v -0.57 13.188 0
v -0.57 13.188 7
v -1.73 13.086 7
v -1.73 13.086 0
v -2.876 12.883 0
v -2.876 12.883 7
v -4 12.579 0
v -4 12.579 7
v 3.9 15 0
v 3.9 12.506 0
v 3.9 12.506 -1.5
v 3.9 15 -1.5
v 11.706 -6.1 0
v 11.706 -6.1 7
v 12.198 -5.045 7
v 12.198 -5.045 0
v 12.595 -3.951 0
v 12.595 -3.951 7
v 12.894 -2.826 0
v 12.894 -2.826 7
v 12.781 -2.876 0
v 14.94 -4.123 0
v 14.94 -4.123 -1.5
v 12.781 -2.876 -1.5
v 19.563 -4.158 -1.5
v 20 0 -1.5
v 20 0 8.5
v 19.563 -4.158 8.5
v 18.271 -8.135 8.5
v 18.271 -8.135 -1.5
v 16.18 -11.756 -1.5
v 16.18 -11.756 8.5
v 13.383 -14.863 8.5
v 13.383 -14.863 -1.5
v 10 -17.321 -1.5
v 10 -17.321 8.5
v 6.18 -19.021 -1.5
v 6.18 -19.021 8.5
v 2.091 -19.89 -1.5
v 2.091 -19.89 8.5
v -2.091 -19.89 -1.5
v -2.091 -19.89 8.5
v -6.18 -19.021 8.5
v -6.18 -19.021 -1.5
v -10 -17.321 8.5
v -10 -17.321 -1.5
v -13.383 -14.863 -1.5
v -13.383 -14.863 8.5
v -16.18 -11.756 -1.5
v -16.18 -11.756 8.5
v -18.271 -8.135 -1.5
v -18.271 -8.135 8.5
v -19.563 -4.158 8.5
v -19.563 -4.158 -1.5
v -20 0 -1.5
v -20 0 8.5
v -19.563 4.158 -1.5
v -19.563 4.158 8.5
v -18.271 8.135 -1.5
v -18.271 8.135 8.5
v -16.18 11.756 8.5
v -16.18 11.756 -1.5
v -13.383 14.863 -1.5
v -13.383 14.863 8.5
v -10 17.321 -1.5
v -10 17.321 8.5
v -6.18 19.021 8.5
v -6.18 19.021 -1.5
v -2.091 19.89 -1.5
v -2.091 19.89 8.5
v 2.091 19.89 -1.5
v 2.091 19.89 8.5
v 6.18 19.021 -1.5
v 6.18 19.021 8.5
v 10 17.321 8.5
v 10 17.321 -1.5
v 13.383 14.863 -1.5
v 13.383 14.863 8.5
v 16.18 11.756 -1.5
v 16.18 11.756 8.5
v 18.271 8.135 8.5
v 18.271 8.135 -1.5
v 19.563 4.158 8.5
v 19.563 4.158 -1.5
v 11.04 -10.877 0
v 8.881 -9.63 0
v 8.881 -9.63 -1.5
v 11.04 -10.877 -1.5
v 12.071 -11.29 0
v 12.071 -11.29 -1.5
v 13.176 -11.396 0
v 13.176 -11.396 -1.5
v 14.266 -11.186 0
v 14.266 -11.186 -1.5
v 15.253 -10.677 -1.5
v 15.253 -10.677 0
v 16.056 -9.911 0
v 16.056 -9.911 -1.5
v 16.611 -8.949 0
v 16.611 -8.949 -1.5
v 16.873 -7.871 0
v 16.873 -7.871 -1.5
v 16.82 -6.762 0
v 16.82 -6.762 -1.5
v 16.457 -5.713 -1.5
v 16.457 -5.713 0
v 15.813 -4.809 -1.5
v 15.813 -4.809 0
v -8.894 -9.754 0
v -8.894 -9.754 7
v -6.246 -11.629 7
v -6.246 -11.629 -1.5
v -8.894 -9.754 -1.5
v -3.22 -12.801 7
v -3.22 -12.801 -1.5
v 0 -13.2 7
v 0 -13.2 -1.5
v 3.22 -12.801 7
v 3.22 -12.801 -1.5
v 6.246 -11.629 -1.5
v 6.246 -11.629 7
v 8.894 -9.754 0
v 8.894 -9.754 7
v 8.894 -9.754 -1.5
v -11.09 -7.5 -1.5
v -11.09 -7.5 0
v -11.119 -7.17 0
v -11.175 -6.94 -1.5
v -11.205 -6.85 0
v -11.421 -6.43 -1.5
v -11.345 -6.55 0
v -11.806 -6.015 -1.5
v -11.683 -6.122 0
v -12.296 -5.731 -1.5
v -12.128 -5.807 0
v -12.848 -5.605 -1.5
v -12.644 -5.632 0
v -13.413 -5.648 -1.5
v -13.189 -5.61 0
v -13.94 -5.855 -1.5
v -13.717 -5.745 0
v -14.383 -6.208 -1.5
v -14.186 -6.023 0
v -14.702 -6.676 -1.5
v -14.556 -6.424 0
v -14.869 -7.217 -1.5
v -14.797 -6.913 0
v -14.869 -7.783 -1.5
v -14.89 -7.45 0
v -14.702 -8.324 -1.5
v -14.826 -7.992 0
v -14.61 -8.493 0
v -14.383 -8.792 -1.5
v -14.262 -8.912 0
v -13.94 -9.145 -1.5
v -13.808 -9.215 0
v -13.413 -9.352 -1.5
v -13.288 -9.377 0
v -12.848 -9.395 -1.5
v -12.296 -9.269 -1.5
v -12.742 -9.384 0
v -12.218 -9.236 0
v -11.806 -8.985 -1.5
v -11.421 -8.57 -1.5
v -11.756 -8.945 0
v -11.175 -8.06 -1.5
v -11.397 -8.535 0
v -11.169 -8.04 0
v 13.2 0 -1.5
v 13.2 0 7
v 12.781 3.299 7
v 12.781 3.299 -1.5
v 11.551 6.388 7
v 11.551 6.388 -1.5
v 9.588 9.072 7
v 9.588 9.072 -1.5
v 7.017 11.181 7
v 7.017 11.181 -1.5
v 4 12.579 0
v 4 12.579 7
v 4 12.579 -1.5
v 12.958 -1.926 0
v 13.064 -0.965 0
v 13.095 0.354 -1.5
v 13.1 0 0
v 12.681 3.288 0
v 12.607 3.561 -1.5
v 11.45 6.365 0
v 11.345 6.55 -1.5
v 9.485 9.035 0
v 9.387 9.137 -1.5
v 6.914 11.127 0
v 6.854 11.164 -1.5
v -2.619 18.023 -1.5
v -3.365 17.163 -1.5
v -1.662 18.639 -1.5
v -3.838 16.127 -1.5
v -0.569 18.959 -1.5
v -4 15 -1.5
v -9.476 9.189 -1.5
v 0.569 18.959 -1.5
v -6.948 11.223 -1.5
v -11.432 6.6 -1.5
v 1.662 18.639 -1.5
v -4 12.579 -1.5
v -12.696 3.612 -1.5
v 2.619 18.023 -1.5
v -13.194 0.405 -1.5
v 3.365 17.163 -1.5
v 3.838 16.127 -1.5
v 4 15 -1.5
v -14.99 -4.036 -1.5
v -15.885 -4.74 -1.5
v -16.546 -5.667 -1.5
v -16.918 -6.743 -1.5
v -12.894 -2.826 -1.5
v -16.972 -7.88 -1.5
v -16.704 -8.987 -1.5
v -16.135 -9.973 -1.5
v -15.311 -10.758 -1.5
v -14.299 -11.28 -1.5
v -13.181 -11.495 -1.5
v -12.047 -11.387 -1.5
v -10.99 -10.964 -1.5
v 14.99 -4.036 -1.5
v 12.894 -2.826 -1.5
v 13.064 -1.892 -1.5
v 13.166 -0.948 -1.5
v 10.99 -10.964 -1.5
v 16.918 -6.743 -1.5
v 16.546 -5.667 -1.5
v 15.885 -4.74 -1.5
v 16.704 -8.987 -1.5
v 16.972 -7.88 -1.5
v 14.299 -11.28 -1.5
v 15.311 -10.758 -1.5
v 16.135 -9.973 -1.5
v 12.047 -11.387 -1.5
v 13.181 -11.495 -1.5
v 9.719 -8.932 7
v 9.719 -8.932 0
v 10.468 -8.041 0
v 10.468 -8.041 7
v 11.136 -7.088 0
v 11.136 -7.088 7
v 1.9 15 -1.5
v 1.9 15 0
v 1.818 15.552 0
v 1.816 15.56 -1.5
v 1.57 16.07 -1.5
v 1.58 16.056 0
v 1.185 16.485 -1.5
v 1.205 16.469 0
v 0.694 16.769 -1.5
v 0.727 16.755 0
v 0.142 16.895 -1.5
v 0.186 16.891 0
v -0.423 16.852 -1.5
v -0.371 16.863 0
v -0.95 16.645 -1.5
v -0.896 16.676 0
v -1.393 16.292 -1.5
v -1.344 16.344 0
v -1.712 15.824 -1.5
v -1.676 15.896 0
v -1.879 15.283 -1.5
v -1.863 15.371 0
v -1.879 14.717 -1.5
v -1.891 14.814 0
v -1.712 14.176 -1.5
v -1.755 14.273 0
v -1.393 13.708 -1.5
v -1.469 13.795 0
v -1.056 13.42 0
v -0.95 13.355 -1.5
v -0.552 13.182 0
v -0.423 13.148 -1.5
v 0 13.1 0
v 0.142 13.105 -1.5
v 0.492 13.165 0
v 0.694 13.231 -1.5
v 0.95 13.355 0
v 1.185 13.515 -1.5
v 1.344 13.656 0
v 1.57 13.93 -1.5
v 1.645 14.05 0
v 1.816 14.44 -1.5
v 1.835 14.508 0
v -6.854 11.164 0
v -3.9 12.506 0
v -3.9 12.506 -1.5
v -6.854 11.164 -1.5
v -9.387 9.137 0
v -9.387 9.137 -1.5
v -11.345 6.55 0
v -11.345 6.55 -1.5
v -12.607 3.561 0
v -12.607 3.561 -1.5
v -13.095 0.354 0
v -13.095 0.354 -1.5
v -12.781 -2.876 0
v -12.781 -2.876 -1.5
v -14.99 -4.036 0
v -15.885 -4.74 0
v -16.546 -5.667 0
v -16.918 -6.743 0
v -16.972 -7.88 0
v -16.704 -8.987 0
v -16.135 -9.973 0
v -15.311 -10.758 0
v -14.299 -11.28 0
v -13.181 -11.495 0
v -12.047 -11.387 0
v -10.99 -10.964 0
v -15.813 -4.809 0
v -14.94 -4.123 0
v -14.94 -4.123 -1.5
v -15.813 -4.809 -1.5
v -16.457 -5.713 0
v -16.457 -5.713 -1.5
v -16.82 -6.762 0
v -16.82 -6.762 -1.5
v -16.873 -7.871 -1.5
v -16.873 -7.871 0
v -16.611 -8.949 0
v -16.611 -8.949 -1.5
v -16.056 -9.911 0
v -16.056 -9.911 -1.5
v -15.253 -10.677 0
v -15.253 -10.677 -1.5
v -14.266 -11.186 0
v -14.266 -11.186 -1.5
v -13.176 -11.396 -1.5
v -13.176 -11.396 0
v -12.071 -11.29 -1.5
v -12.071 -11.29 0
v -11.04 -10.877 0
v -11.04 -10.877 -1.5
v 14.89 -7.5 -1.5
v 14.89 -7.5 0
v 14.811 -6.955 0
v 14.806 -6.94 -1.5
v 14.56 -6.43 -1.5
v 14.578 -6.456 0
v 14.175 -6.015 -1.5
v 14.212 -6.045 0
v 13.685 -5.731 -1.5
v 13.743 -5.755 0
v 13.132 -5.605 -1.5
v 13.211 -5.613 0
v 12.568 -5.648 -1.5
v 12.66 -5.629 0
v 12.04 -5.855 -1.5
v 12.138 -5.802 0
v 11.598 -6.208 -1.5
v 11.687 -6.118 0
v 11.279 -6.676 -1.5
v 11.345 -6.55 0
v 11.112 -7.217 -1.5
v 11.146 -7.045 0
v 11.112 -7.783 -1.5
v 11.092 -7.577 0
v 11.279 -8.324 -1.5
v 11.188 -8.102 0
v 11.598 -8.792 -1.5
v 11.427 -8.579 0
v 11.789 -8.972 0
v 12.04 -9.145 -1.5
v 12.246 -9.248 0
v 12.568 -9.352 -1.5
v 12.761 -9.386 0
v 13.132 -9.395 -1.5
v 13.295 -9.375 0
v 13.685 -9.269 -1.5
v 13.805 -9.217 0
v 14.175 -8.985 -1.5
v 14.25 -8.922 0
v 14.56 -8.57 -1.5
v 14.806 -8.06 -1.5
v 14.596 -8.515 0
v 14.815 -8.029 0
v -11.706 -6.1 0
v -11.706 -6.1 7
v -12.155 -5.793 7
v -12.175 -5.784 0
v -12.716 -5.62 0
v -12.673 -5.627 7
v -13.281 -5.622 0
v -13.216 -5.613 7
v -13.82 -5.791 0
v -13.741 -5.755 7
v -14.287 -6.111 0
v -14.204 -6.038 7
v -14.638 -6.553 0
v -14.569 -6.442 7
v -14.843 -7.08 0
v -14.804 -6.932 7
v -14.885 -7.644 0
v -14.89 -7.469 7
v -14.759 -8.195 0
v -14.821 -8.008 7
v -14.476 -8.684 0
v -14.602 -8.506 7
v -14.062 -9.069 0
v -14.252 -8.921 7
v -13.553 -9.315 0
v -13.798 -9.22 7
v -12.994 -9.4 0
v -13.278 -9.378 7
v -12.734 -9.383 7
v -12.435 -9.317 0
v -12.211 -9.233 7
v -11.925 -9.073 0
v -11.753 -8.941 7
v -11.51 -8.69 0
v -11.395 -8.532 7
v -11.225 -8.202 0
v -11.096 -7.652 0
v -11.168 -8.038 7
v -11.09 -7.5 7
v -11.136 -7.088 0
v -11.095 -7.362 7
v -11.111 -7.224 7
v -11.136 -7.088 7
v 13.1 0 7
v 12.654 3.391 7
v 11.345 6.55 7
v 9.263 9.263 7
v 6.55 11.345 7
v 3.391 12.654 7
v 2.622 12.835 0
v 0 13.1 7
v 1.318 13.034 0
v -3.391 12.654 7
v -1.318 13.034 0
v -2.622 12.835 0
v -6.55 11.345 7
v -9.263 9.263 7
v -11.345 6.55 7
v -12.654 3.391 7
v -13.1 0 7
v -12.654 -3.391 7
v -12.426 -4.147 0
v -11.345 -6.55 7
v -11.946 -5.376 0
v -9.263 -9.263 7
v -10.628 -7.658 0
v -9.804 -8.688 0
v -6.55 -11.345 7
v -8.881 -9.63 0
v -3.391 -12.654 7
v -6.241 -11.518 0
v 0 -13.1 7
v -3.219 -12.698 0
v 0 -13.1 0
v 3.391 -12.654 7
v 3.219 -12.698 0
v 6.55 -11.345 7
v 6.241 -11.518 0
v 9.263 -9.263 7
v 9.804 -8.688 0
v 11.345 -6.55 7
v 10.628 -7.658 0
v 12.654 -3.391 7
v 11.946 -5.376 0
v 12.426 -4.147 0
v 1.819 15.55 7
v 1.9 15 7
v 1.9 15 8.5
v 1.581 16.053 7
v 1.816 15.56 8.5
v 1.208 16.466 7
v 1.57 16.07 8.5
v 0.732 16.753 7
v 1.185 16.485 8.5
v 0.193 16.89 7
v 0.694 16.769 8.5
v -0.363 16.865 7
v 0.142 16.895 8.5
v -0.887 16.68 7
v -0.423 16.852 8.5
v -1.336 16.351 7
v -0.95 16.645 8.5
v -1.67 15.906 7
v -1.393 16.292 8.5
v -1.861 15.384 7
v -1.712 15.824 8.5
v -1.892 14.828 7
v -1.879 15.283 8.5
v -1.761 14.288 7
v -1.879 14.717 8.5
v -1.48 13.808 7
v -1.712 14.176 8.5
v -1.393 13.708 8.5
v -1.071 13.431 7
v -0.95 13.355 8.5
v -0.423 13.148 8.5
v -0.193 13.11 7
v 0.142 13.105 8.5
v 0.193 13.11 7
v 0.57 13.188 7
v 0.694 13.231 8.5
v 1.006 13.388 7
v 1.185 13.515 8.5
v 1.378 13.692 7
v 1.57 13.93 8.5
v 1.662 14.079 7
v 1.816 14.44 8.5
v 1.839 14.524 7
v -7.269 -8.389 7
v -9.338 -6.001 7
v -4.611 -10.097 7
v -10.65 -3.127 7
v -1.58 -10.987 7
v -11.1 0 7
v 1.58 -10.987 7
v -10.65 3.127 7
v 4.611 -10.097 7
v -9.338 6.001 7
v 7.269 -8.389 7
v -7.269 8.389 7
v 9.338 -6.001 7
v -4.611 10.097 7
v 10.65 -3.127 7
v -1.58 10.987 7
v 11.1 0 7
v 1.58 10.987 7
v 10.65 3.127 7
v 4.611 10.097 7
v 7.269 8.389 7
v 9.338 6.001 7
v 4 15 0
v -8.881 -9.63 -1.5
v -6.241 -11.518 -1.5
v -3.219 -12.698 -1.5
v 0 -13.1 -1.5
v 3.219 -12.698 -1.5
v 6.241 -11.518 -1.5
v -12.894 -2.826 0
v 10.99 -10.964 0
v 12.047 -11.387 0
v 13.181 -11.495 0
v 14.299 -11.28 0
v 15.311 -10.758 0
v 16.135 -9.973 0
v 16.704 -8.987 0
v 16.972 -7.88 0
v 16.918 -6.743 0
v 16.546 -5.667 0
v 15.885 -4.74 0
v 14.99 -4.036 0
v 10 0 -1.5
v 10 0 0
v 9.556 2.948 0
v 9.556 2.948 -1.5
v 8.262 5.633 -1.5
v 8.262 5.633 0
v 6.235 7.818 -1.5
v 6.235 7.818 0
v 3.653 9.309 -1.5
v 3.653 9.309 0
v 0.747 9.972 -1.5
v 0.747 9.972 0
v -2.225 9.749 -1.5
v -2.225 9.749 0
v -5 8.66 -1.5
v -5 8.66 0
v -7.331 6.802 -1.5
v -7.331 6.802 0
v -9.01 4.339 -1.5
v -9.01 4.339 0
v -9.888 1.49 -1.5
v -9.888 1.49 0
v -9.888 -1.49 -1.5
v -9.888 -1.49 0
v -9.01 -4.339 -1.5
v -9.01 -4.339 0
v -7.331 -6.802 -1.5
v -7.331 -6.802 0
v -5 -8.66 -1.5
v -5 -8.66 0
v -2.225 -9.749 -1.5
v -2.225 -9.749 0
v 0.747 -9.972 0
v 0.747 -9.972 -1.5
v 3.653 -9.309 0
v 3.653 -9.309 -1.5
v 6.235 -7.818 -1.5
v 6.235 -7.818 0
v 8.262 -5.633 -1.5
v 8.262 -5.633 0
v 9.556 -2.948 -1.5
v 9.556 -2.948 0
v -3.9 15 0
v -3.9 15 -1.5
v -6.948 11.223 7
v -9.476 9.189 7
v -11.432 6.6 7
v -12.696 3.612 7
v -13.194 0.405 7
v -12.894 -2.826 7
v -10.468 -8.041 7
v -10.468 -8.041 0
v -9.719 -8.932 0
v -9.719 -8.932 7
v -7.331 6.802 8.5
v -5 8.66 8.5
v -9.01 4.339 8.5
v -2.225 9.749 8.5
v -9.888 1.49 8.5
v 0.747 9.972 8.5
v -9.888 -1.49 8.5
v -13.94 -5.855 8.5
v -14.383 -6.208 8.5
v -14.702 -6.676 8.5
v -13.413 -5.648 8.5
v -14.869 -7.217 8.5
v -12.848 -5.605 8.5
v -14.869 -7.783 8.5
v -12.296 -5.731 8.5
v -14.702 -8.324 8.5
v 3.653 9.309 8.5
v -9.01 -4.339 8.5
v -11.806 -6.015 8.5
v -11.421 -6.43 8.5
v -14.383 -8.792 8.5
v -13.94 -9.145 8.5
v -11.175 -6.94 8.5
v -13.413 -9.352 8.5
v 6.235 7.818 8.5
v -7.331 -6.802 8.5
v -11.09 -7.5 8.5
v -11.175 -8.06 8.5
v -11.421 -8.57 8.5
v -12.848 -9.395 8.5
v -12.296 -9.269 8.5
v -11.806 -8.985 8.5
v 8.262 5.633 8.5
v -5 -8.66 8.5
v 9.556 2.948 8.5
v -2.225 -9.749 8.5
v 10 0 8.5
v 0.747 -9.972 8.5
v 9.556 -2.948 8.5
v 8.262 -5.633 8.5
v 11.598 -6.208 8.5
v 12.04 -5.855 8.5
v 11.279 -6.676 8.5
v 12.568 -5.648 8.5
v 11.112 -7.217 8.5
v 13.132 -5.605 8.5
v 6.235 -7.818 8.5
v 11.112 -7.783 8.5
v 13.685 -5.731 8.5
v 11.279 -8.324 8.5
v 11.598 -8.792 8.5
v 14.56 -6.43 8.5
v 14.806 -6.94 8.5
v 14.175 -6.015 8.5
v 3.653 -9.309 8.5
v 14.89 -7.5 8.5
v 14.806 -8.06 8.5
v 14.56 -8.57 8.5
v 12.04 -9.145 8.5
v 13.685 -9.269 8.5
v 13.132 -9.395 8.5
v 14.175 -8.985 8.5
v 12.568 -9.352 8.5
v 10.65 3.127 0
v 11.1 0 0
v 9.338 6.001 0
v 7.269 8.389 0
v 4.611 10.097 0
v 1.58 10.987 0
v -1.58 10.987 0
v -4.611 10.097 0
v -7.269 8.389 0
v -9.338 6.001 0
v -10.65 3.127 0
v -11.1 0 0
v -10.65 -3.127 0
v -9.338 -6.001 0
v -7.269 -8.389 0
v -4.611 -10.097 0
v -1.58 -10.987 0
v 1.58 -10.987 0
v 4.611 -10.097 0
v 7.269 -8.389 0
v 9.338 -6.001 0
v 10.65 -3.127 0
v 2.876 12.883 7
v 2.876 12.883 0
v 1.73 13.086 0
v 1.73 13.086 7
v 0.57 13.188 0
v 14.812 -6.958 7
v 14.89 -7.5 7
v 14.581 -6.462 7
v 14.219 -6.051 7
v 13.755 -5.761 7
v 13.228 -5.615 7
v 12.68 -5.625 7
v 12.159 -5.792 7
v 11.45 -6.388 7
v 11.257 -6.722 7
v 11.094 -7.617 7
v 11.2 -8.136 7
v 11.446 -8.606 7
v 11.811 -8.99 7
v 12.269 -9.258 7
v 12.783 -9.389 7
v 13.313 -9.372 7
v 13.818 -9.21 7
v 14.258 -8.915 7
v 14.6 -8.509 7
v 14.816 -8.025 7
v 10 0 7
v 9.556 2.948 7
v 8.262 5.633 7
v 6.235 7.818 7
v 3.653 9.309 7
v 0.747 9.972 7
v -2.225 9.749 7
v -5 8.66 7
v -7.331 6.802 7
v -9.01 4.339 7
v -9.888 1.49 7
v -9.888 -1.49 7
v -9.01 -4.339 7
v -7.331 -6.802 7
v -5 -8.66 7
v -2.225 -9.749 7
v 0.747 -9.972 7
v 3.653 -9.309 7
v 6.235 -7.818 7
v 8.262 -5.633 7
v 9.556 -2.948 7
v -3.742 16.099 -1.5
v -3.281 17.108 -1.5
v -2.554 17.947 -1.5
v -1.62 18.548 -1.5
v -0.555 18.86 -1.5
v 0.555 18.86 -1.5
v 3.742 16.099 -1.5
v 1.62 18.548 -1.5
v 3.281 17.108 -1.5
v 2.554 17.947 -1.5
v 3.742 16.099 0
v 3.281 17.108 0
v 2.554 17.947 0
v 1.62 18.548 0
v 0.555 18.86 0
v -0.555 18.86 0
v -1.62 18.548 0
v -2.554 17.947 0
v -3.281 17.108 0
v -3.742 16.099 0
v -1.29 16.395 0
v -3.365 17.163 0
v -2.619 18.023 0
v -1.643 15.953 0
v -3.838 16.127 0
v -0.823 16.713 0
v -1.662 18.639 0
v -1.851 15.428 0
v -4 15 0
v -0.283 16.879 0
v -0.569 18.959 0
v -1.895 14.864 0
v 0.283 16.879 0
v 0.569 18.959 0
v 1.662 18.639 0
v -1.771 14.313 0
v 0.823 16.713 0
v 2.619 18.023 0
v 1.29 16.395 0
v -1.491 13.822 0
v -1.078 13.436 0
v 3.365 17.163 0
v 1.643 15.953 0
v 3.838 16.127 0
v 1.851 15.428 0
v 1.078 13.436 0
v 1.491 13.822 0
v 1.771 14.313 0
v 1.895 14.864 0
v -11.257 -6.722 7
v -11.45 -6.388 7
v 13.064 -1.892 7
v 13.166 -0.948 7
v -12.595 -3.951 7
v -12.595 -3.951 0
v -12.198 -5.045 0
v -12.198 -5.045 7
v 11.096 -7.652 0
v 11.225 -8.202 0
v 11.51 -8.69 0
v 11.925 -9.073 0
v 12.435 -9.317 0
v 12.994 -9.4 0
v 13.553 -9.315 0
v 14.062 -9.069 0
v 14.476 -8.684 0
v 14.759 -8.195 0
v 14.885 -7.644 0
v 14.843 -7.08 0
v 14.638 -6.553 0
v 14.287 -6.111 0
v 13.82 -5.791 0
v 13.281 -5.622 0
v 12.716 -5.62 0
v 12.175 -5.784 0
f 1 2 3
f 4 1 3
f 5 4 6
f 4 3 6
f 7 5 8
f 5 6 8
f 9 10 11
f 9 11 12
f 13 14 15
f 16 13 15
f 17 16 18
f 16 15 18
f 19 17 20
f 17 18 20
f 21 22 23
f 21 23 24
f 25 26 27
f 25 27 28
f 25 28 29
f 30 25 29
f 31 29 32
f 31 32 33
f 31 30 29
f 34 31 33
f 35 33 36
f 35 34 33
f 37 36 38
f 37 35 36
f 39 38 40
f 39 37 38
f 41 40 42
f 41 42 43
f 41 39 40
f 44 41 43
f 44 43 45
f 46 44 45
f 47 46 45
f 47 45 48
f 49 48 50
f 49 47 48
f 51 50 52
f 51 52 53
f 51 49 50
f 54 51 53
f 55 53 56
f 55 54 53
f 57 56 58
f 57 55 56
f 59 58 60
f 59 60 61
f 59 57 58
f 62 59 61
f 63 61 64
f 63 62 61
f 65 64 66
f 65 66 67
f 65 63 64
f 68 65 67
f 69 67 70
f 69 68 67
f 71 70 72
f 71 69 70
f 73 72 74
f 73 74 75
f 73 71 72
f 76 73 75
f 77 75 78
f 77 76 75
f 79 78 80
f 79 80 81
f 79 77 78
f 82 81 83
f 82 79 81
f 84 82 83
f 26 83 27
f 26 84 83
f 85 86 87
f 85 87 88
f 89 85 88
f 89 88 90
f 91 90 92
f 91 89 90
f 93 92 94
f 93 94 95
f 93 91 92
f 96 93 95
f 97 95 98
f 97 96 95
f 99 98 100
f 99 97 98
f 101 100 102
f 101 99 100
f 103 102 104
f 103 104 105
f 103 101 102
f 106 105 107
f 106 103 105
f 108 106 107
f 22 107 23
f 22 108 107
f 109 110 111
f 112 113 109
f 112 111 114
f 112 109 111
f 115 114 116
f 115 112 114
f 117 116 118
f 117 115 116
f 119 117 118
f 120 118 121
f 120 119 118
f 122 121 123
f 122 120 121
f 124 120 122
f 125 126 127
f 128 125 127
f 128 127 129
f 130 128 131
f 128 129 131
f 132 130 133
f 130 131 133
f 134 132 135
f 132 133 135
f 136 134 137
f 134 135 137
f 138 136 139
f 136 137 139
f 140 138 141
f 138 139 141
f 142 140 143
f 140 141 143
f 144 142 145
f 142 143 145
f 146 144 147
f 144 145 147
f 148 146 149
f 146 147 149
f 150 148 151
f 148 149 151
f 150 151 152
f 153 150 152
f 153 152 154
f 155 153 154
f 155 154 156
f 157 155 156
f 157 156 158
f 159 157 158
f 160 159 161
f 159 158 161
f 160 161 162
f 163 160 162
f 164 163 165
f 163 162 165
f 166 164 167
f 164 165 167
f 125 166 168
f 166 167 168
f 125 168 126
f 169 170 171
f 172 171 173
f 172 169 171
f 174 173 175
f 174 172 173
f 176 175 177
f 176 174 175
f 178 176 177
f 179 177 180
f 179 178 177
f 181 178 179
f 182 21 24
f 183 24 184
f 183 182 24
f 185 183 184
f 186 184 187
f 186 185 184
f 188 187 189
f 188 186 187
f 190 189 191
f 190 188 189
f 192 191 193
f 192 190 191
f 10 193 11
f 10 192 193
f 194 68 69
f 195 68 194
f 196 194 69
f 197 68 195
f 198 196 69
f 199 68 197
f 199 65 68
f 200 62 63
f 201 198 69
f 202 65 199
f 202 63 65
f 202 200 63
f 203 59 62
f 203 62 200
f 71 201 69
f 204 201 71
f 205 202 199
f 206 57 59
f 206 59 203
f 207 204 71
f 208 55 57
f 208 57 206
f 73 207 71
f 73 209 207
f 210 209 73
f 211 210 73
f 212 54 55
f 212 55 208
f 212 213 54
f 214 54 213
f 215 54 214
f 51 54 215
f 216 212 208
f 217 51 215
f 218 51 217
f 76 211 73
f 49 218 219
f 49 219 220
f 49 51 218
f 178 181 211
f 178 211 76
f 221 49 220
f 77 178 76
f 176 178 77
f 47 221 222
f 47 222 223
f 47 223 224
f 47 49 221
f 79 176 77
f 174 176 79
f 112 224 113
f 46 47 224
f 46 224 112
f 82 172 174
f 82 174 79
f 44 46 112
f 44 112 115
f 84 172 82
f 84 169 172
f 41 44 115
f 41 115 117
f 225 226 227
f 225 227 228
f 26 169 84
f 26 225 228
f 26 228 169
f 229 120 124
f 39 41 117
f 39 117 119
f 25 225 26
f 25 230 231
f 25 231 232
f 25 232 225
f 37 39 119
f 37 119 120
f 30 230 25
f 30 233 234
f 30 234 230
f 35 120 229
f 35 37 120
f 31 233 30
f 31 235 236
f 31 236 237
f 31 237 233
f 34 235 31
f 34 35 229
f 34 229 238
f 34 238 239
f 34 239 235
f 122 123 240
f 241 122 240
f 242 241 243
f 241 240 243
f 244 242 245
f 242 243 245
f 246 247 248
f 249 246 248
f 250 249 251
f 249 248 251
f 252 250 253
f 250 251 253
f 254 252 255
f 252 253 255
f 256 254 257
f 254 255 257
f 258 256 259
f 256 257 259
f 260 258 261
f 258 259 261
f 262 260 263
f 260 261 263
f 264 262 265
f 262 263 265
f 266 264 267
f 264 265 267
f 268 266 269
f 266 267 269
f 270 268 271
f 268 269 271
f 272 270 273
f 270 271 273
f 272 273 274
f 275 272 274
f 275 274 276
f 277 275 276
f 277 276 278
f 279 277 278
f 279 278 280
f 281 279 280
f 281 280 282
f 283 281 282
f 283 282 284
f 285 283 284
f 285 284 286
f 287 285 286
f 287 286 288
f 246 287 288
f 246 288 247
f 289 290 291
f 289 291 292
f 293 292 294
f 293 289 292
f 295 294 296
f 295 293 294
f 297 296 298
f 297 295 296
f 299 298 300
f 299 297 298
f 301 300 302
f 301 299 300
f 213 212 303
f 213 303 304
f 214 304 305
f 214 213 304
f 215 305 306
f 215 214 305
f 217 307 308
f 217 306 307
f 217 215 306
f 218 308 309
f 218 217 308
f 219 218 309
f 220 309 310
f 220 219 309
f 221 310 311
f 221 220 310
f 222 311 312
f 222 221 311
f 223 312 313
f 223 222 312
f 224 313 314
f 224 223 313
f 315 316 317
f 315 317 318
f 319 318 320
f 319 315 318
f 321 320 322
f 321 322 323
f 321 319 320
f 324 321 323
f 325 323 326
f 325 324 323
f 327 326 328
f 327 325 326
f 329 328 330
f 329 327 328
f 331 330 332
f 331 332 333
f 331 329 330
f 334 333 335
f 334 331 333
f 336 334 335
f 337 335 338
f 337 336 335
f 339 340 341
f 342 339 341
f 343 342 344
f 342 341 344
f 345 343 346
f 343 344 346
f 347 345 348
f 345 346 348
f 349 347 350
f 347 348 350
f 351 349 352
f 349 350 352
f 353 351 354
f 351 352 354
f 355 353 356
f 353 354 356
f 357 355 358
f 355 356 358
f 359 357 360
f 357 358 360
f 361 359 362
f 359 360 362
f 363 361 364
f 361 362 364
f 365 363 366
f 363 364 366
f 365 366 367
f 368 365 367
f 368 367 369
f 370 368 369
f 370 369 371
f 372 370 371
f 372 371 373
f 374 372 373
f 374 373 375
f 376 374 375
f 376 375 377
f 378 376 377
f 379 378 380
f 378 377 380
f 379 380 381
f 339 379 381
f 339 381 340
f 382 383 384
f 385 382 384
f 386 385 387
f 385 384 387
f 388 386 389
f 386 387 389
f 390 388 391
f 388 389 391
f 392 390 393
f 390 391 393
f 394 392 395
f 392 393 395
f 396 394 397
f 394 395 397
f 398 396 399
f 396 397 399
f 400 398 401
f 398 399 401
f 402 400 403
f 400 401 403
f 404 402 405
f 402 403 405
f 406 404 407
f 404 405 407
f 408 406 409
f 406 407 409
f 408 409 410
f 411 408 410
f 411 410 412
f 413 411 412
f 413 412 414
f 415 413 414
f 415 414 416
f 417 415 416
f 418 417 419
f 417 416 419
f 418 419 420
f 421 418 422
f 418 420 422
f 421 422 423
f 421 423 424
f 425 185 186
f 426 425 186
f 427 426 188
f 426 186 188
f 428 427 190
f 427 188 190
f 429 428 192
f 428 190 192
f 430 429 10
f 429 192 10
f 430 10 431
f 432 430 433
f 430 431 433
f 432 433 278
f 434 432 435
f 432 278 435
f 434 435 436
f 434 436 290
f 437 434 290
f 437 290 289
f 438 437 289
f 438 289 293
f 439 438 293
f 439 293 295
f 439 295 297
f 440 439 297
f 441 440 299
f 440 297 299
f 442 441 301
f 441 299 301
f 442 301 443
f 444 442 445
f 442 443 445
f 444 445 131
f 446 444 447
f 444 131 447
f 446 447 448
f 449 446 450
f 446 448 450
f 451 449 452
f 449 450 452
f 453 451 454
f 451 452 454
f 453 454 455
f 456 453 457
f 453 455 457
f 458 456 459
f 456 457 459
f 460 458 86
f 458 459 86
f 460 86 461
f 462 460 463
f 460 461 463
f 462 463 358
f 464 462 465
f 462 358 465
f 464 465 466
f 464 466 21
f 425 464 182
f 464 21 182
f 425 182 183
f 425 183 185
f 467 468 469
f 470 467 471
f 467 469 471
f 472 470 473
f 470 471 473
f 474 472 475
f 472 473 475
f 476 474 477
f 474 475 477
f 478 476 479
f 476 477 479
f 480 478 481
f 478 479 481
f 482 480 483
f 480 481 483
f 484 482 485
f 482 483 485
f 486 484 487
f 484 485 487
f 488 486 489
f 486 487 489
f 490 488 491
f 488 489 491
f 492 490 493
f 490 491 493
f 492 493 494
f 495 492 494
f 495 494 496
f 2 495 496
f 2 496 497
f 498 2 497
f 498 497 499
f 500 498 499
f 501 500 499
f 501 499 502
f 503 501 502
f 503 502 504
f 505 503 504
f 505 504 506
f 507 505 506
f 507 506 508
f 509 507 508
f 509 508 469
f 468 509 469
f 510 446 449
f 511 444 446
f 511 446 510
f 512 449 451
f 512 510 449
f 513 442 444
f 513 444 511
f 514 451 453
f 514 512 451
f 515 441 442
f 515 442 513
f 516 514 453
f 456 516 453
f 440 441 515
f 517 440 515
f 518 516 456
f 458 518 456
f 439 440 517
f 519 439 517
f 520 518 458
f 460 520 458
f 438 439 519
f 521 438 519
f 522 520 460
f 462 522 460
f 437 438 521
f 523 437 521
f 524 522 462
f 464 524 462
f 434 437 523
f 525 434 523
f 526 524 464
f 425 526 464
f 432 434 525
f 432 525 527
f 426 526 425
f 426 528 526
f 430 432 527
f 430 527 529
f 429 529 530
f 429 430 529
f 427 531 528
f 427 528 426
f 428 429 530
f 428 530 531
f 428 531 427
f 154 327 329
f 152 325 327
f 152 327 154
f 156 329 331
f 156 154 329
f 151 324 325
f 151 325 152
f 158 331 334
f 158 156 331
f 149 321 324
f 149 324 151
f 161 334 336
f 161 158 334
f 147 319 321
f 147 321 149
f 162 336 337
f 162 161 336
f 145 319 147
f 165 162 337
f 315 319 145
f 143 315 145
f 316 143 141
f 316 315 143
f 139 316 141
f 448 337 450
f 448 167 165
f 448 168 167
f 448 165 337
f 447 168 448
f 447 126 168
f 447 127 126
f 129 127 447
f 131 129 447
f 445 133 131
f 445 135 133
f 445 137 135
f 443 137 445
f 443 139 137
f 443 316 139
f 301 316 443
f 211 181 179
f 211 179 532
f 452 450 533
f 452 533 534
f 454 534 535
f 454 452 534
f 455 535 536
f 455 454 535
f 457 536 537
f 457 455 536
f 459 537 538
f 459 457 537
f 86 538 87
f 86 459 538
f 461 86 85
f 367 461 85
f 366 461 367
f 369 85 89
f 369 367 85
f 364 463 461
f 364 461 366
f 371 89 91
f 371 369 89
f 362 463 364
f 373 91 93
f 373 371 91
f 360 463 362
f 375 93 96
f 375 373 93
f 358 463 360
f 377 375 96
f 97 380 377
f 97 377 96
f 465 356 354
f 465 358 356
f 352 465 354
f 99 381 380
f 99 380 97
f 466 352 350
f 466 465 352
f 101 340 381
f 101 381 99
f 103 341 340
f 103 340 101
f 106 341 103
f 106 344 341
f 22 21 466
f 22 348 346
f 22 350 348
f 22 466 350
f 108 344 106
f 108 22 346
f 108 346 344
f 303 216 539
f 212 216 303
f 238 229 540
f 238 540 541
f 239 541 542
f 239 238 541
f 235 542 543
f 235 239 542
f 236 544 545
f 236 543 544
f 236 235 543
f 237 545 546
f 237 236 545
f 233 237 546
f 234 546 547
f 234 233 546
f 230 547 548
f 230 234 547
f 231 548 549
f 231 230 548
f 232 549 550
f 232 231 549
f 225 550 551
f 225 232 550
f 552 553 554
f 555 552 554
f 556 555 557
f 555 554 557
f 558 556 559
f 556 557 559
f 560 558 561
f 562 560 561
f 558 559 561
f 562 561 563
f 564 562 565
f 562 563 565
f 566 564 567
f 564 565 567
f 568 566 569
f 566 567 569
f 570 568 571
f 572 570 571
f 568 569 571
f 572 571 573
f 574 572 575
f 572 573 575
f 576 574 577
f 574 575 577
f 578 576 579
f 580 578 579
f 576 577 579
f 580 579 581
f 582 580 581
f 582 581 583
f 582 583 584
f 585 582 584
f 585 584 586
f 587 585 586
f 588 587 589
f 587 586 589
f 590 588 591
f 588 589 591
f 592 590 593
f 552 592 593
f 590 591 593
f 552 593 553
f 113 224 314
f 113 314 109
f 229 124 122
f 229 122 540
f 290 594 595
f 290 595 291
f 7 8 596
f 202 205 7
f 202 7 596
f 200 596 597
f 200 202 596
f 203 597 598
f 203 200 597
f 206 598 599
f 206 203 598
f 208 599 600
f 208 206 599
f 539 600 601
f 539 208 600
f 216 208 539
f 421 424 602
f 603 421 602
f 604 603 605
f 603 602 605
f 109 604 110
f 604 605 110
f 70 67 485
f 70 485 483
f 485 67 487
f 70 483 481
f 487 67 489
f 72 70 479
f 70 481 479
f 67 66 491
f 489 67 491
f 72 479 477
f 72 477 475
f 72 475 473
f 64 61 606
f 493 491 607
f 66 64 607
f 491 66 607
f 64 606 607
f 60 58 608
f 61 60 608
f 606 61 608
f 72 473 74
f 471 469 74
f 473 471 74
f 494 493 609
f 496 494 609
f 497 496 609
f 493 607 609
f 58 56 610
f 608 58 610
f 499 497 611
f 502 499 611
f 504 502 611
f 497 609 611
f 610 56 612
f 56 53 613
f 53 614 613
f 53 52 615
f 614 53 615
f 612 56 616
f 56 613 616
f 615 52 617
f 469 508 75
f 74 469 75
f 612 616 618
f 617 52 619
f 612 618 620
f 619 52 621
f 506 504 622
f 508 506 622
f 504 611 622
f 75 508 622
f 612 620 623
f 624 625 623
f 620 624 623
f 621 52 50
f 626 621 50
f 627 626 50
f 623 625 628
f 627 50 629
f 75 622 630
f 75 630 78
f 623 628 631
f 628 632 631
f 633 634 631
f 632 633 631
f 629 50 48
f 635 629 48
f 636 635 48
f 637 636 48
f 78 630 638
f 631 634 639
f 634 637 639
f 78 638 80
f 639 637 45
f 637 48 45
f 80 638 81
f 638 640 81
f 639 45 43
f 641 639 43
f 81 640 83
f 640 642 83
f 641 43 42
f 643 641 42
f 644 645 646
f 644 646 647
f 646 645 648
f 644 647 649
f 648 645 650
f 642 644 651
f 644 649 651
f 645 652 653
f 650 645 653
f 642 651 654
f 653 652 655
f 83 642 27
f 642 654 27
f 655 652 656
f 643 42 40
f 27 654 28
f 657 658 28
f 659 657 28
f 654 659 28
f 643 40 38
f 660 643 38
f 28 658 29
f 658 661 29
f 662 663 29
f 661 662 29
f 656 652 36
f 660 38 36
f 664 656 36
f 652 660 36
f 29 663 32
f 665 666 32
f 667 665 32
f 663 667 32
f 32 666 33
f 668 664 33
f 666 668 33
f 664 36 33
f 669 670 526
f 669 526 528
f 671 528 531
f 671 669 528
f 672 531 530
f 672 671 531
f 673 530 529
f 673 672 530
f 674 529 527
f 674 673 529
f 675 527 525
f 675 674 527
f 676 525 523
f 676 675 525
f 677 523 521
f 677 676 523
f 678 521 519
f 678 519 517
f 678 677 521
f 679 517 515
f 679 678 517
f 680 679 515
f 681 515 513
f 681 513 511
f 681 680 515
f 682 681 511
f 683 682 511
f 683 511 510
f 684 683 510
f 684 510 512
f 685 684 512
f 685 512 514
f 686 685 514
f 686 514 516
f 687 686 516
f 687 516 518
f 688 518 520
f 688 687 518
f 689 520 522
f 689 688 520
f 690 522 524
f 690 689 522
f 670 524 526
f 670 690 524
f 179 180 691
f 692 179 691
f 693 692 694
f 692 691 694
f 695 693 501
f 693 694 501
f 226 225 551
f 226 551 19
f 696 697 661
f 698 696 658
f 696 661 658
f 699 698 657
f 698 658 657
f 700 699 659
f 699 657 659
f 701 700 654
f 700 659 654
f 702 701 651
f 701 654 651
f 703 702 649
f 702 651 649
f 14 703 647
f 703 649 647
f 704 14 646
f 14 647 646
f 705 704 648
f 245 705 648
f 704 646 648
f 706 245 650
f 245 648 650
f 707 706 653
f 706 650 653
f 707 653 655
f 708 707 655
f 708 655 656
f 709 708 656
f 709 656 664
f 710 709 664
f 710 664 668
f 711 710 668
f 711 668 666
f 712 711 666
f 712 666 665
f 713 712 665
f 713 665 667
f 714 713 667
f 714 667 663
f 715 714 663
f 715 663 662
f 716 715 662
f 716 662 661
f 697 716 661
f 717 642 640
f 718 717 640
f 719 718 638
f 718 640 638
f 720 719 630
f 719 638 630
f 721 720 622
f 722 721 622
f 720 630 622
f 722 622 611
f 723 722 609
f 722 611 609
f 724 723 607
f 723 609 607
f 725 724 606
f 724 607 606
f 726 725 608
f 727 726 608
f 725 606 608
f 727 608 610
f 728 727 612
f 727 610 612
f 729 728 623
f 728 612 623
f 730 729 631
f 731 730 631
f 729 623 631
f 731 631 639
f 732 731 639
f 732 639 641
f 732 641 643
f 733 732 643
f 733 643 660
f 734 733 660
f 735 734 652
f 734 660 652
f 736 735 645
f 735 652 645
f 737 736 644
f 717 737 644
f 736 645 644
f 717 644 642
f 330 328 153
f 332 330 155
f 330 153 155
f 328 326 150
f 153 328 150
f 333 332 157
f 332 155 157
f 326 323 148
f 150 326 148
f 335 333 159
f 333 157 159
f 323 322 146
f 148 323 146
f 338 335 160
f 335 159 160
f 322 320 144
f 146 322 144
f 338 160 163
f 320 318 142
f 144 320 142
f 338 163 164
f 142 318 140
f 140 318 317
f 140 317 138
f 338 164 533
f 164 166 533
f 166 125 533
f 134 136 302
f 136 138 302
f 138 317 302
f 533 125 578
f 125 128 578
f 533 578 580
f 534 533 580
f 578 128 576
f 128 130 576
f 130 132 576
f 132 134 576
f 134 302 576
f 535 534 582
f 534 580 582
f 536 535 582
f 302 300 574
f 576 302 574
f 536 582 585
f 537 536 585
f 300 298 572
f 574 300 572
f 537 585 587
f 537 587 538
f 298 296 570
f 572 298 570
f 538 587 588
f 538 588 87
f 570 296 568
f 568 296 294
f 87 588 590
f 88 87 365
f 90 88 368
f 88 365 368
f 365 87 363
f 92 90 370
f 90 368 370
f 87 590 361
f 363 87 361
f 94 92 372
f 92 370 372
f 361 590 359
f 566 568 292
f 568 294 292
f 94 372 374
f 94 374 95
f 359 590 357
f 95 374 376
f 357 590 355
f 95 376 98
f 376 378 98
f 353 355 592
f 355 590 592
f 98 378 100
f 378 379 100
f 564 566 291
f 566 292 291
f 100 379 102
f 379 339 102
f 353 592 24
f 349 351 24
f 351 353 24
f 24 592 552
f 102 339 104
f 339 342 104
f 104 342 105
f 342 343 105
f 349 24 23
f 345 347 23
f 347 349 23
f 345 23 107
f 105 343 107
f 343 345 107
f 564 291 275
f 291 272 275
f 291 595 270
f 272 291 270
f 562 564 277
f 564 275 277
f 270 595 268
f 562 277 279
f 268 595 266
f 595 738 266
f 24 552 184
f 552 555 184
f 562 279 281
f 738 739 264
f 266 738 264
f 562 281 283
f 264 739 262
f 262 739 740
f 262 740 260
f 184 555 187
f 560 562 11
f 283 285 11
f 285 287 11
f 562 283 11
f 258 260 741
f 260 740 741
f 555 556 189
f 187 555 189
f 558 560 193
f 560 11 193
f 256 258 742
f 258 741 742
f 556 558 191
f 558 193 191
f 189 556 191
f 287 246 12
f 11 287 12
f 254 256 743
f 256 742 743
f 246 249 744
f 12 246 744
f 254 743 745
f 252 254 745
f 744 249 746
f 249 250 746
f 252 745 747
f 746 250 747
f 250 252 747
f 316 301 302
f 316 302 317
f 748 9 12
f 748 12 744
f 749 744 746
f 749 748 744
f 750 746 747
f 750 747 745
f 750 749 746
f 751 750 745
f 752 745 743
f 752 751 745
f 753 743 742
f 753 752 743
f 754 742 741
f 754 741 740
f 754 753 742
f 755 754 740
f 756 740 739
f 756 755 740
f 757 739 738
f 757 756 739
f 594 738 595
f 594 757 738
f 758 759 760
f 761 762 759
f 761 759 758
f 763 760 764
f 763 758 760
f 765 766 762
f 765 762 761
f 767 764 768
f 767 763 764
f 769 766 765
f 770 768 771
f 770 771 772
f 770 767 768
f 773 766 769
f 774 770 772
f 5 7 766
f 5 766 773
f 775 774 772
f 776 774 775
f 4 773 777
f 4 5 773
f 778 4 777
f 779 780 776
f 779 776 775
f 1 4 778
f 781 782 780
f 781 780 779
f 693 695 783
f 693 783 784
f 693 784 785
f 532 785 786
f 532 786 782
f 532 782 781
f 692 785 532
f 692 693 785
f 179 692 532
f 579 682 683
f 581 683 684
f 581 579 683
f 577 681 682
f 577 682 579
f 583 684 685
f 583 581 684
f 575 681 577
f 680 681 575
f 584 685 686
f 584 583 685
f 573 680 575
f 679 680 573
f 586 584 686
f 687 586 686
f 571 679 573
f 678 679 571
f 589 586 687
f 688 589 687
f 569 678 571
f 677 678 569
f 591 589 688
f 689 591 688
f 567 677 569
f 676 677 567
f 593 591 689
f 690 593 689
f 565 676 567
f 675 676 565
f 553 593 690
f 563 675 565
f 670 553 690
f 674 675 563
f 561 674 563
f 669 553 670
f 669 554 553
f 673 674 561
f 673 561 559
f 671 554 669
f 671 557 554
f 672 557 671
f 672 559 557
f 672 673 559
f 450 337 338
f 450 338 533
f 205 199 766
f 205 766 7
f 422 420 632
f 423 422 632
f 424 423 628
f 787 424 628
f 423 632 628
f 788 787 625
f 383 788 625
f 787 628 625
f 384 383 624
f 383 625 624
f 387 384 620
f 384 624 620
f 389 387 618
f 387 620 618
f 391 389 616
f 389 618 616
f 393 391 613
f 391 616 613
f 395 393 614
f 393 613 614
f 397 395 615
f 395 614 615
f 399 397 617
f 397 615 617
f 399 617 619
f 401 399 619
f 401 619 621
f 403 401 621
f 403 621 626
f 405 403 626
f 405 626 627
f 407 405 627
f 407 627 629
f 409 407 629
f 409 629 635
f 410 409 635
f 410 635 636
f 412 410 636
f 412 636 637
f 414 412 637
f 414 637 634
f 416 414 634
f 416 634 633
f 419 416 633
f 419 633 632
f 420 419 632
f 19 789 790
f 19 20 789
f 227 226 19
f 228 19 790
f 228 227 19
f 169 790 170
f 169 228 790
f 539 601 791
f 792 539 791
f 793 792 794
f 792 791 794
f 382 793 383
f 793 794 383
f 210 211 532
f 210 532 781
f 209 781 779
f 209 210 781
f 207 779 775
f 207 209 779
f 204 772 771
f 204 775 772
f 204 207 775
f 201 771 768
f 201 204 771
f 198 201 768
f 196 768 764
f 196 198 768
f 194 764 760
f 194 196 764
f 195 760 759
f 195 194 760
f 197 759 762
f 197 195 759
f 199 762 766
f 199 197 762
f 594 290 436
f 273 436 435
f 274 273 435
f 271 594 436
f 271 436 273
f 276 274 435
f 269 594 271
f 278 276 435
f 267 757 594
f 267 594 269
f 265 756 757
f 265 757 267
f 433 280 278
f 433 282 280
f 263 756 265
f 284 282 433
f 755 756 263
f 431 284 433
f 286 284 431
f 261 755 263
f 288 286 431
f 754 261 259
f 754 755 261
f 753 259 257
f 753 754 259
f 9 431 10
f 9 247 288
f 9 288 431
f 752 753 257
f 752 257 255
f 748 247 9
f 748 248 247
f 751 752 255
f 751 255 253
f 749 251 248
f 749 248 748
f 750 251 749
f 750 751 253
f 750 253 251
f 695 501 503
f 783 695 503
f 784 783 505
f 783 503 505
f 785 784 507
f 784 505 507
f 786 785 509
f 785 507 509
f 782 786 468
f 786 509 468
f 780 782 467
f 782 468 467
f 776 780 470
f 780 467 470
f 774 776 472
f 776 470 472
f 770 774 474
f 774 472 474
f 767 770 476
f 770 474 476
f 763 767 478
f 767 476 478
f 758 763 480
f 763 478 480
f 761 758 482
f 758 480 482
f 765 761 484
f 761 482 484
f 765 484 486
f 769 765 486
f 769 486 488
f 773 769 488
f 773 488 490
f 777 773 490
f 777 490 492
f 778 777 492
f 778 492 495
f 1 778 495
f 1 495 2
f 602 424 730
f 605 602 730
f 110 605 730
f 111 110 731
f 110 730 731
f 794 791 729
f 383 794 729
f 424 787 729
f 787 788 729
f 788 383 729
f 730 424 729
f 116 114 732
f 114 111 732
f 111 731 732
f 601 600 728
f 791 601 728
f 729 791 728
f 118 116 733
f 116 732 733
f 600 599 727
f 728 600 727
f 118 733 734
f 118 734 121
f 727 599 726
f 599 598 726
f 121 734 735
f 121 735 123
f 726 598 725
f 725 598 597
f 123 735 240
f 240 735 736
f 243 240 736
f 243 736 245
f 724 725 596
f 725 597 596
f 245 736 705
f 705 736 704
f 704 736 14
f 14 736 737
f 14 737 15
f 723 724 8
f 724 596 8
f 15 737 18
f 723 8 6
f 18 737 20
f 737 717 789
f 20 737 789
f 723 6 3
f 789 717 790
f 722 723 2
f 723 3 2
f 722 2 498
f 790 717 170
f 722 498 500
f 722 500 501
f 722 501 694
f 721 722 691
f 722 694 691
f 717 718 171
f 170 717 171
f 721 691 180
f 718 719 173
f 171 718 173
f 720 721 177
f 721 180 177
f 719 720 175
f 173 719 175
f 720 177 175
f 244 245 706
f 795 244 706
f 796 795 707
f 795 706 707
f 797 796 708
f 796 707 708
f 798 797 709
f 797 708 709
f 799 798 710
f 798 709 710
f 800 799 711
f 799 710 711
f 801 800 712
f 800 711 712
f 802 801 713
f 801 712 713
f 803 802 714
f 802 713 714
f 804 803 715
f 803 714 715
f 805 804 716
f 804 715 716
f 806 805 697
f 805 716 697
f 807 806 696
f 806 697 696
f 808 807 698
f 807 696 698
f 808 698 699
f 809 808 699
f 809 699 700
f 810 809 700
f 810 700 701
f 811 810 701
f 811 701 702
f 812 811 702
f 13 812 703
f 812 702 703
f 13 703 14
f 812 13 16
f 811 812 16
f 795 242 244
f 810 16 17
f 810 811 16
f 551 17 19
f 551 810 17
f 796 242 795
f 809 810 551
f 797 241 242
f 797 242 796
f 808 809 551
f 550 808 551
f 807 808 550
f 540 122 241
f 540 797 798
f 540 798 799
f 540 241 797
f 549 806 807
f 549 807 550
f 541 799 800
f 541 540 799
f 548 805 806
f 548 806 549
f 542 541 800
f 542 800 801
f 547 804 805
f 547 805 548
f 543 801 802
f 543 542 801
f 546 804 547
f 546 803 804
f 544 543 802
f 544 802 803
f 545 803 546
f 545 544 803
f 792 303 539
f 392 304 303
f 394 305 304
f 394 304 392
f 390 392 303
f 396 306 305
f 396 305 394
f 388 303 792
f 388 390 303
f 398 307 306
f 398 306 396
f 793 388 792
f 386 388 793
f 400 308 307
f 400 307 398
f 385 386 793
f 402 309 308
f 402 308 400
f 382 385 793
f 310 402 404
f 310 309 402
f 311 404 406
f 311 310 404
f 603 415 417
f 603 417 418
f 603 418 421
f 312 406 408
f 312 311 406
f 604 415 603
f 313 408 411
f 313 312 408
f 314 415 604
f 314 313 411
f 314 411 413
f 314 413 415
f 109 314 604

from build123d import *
from build123d import SkipClean  # not in build123d's __all__

# Parameters (mm, degrees)
F0_R     = 1.9
F0_R_2   = 10
F1_DEPTH = 1.5
F2_R     = 13.1
F2_R_2   = 11.1
F3_DEPTH = 7
F4_R     = 20
F5_DEPTH = 10
F6_R     = 19.4230477787
F6_R_2   = 1.9
F6_R_3   = 10
F7_DEPTH = 1.5
F9_DEPTH = 7


with BuildPart() as f1:
    # F0 (on Top) → F1 (new body)
    with BuildSketch(Plane.XY):
        with BuildLine():
            Line((-3.9, 15), (-3.9, 12.5059985607))
            ThreePointArc((-3.9, 12.5059985607), (-11.3449327896, 6.55), (-12.7805124532, -2.8755002056))
            Line((-12.7805124532, -2.8755002056), (-14.9403810568, -4.1225009252))
            ThreePointArc((-14.9403810568, -4.1225009252), (-16.3678801315, -9.45), (-11.0403810568, -10.8774990748))
            Line((-11.0403810568, -10.8774990748), (-8.8805124532, -9.6304983551))
            ThreePointArc((-8.8805124532, -9.6304983551), (0, -13.1), (8.8805124532, -9.6304983551))
            Line((8.8805124532, -9.6304983551), (11.0403810568, -10.8774990748))
            ThreePointArc((11.0403810568, -10.8774990748), (16.3678801315, -9.45), (14.9403810568, -4.1225009252))
            Line((14.9403810568, -4.1225009252), (12.7805124532, -2.8755002056))
            ThreePointArc((12.7805124532, -2.8755002056), (11.3449327896, 6.55), (3.9, 12.5059985607))
            Line((3.9, 12.5059985607), (3.9, 15))
            ThreePointArc((3.9, 15), (0, 18.9), (-3.9, 15))
        make_face()
        with Locations((-12.9903810568, -7.5)):
            Circle(F0_R, mode=Mode.SUBTRACT)
        with Locations((12.9903810568, -7.5)):
            Circle(F0_R, mode=Mode.SUBTRACT)
        Circle(F0_R_2, mode=Mode.SUBTRACT)
        with Locations((0, 15)):
            Circle(F0_R, mode=Mode.SUBTRACT)
    extrude(amount=-F1_DEPTH)

    # F2 (on face) → F3 (join)
    with BuildSketch(Plane.XY):
        Circle(F2_R)
        Circle(F2_R_2, mode=Mode.SUBTRACT)
    with SkipClean():  # cleaning this boolean's faces spoils the solid; the shape is the same uncleaned
        extrude(amount=F3_DEPTH)


with BuildPart() as f5:
    # F4 (on face) → F5 (new body)
    with BuildSketch(Plane(origin=(0, 0, -1.5), x_dir=(1, 0, 0), z_dir=(0, 0, -1))):
        Circle(F4_R)
        with BuildLine():
            ThreePointArc((12.8940350651, 2.8255724623), (13.1232858473, 1.4210448868), (13.2, 0))
            ThreePointArc((13.2, 0), (10.6545764815, -7.7923038955), (4, -12.5793481548))
            Line((4, -12.5793481548), (4, -15))
            ThreePointArc((4, -15), (0, -19), (-4, -15))
            Line((-4, -15), (-4, -12.5793481548))
            ThreePointArc((-4, -12.5793481548), (-11.43153533, -6.6), (-12.8940350651, 2.8255724623))
            Line((-12.8940350651, 2.8255724623), (-14.9903810568, 4.0358983849))
            ThreePointArc((-14.9903810568, 4.0358983849), (-16.4544826719, 9.5), (-10.9903810568, 10.9641016151))
            Line((-10.9903810568, 10.9641016151), (-8.8940350651, 9.7537756925))
            ThreePointArc((-8.8940350651, 9.7537756925), (0, 13.2), (8.8940350651, 9.7537756925))
            Line((8.8940350651, 9.7537756925), (10.9903810568, 10.9641016151))
            ThreePointArc((10.9903810568, 10.9641016151), (16.4544826719, 9.5), (14.9903810568, 4.0358983849))
            Line((14.9903810568, 4.0358983849), (12.8940350651, 2.8255724623))
        make_face(mode=Mode.SUBTRACT)
    extrude(amount=-F5_DEPTH)

    # F6 (on face) → F7 (join)
    with BuildSketch(Plane.XY.offset(8.5)):
        Circle(F6_R)
        with Locations((-12.9903810568, -7.5)):
            Circle(F6_R_2, mode=Mode.SUBTRACT)
        with Locations((12.9903810568, -7.5)):
            Circle(F6_R_2, mode=Mode.SUBTRACT)
        Circle(F6_R_3, mode=Mode.SUBTRACT)
        with Locations((0, 15)):
            Circle(F6_R_2, mode=Mode.SUBTRACT)
    extrude(amount=-F7_DEPTH)

    # F8 (on face) → F9 (join)
    with BuildSketch(Plane(origin=(0, 0, 7), x_dir=(1, 0, 0), z_dir=(0, 0, -1))):
        with BuildLine():
            Line((-14.9903810568, 4.0358983849), (-12.8940350651, 2.8255724623))
            ThreePointArc((-12.8940350651, 2.8255724623), (-12.4085336618, 4.5020320261), (-11.7060945509, 6.099782813))
            ThreePointArc((-11.7060945509, 6.099782813), (-14.635829324, 8.45), (-11.1356141491, 7.0878838537))
            ThreePointArc((-11.1356141491, 7.0878838537), (-10.1031409341, 8.4950893618), (-8.8940350651, 9.7537756925))
            Line((-8.8940350651, 9.7537756925), (-10.9903810568, 10.9641016151))
            ThreePointArc((-10.9903810568, 10.9641016151), (-16.4544826719, 9.5), (-14.9903810568, 4.0358983849))
        make_face()
        with BuildLine():
            ThreePointArc((-4, -15), (0, -19), (4, -15))
            Line((4, -15), (4, -12.5793481548))
            ThreePointArc((4, -12.5793481548), (2.3053927277, -12.9971213879), (0.5704804018, -13.1876666667))
            ThreePointArc((0.5704804018, -13.1876666667), (0, -16.9), (-0.5704804018, -13.1876666667))
            ThreePointArc((-0.5704804018, -13.1876666667), (-2.3053927277, -12.9971213879), (-4, -12.5793481548))
            Line((-4, -12.5793481548), (-4, -15))
        make_face()
        with BuildLine():
            ThreePointArc((14.9903810568, 4.0358983849), (16.4544826719, 9.5), (10.9903810568, 10.9641016151))
            Line((10.9903810568, 10.9641016151), (8.8940350651, 9.7537756925))
            ThreePointArc((8.8940350651, 9.7537756925), (10.1031409341, 8.4950893618), (11.1356141491, 7.0878838537))
            ThreePointArc((11.1356141491, 7.0878838537), (14.635829324, 8.45), (11.7060945509, 6.099782813))
            ThreePointArc((11.7060945509, 6.099782813), (12.4085336618, 4.5020320261), (12.8940350651, 2.8255724623))
            Line((12.8940350651, 2.8255724623), (14.9903810568, 4.0358983849))
        make_face()
    extrude(amount=F9_DEPTH)


solid = Compound([f1.part, f5.part])
